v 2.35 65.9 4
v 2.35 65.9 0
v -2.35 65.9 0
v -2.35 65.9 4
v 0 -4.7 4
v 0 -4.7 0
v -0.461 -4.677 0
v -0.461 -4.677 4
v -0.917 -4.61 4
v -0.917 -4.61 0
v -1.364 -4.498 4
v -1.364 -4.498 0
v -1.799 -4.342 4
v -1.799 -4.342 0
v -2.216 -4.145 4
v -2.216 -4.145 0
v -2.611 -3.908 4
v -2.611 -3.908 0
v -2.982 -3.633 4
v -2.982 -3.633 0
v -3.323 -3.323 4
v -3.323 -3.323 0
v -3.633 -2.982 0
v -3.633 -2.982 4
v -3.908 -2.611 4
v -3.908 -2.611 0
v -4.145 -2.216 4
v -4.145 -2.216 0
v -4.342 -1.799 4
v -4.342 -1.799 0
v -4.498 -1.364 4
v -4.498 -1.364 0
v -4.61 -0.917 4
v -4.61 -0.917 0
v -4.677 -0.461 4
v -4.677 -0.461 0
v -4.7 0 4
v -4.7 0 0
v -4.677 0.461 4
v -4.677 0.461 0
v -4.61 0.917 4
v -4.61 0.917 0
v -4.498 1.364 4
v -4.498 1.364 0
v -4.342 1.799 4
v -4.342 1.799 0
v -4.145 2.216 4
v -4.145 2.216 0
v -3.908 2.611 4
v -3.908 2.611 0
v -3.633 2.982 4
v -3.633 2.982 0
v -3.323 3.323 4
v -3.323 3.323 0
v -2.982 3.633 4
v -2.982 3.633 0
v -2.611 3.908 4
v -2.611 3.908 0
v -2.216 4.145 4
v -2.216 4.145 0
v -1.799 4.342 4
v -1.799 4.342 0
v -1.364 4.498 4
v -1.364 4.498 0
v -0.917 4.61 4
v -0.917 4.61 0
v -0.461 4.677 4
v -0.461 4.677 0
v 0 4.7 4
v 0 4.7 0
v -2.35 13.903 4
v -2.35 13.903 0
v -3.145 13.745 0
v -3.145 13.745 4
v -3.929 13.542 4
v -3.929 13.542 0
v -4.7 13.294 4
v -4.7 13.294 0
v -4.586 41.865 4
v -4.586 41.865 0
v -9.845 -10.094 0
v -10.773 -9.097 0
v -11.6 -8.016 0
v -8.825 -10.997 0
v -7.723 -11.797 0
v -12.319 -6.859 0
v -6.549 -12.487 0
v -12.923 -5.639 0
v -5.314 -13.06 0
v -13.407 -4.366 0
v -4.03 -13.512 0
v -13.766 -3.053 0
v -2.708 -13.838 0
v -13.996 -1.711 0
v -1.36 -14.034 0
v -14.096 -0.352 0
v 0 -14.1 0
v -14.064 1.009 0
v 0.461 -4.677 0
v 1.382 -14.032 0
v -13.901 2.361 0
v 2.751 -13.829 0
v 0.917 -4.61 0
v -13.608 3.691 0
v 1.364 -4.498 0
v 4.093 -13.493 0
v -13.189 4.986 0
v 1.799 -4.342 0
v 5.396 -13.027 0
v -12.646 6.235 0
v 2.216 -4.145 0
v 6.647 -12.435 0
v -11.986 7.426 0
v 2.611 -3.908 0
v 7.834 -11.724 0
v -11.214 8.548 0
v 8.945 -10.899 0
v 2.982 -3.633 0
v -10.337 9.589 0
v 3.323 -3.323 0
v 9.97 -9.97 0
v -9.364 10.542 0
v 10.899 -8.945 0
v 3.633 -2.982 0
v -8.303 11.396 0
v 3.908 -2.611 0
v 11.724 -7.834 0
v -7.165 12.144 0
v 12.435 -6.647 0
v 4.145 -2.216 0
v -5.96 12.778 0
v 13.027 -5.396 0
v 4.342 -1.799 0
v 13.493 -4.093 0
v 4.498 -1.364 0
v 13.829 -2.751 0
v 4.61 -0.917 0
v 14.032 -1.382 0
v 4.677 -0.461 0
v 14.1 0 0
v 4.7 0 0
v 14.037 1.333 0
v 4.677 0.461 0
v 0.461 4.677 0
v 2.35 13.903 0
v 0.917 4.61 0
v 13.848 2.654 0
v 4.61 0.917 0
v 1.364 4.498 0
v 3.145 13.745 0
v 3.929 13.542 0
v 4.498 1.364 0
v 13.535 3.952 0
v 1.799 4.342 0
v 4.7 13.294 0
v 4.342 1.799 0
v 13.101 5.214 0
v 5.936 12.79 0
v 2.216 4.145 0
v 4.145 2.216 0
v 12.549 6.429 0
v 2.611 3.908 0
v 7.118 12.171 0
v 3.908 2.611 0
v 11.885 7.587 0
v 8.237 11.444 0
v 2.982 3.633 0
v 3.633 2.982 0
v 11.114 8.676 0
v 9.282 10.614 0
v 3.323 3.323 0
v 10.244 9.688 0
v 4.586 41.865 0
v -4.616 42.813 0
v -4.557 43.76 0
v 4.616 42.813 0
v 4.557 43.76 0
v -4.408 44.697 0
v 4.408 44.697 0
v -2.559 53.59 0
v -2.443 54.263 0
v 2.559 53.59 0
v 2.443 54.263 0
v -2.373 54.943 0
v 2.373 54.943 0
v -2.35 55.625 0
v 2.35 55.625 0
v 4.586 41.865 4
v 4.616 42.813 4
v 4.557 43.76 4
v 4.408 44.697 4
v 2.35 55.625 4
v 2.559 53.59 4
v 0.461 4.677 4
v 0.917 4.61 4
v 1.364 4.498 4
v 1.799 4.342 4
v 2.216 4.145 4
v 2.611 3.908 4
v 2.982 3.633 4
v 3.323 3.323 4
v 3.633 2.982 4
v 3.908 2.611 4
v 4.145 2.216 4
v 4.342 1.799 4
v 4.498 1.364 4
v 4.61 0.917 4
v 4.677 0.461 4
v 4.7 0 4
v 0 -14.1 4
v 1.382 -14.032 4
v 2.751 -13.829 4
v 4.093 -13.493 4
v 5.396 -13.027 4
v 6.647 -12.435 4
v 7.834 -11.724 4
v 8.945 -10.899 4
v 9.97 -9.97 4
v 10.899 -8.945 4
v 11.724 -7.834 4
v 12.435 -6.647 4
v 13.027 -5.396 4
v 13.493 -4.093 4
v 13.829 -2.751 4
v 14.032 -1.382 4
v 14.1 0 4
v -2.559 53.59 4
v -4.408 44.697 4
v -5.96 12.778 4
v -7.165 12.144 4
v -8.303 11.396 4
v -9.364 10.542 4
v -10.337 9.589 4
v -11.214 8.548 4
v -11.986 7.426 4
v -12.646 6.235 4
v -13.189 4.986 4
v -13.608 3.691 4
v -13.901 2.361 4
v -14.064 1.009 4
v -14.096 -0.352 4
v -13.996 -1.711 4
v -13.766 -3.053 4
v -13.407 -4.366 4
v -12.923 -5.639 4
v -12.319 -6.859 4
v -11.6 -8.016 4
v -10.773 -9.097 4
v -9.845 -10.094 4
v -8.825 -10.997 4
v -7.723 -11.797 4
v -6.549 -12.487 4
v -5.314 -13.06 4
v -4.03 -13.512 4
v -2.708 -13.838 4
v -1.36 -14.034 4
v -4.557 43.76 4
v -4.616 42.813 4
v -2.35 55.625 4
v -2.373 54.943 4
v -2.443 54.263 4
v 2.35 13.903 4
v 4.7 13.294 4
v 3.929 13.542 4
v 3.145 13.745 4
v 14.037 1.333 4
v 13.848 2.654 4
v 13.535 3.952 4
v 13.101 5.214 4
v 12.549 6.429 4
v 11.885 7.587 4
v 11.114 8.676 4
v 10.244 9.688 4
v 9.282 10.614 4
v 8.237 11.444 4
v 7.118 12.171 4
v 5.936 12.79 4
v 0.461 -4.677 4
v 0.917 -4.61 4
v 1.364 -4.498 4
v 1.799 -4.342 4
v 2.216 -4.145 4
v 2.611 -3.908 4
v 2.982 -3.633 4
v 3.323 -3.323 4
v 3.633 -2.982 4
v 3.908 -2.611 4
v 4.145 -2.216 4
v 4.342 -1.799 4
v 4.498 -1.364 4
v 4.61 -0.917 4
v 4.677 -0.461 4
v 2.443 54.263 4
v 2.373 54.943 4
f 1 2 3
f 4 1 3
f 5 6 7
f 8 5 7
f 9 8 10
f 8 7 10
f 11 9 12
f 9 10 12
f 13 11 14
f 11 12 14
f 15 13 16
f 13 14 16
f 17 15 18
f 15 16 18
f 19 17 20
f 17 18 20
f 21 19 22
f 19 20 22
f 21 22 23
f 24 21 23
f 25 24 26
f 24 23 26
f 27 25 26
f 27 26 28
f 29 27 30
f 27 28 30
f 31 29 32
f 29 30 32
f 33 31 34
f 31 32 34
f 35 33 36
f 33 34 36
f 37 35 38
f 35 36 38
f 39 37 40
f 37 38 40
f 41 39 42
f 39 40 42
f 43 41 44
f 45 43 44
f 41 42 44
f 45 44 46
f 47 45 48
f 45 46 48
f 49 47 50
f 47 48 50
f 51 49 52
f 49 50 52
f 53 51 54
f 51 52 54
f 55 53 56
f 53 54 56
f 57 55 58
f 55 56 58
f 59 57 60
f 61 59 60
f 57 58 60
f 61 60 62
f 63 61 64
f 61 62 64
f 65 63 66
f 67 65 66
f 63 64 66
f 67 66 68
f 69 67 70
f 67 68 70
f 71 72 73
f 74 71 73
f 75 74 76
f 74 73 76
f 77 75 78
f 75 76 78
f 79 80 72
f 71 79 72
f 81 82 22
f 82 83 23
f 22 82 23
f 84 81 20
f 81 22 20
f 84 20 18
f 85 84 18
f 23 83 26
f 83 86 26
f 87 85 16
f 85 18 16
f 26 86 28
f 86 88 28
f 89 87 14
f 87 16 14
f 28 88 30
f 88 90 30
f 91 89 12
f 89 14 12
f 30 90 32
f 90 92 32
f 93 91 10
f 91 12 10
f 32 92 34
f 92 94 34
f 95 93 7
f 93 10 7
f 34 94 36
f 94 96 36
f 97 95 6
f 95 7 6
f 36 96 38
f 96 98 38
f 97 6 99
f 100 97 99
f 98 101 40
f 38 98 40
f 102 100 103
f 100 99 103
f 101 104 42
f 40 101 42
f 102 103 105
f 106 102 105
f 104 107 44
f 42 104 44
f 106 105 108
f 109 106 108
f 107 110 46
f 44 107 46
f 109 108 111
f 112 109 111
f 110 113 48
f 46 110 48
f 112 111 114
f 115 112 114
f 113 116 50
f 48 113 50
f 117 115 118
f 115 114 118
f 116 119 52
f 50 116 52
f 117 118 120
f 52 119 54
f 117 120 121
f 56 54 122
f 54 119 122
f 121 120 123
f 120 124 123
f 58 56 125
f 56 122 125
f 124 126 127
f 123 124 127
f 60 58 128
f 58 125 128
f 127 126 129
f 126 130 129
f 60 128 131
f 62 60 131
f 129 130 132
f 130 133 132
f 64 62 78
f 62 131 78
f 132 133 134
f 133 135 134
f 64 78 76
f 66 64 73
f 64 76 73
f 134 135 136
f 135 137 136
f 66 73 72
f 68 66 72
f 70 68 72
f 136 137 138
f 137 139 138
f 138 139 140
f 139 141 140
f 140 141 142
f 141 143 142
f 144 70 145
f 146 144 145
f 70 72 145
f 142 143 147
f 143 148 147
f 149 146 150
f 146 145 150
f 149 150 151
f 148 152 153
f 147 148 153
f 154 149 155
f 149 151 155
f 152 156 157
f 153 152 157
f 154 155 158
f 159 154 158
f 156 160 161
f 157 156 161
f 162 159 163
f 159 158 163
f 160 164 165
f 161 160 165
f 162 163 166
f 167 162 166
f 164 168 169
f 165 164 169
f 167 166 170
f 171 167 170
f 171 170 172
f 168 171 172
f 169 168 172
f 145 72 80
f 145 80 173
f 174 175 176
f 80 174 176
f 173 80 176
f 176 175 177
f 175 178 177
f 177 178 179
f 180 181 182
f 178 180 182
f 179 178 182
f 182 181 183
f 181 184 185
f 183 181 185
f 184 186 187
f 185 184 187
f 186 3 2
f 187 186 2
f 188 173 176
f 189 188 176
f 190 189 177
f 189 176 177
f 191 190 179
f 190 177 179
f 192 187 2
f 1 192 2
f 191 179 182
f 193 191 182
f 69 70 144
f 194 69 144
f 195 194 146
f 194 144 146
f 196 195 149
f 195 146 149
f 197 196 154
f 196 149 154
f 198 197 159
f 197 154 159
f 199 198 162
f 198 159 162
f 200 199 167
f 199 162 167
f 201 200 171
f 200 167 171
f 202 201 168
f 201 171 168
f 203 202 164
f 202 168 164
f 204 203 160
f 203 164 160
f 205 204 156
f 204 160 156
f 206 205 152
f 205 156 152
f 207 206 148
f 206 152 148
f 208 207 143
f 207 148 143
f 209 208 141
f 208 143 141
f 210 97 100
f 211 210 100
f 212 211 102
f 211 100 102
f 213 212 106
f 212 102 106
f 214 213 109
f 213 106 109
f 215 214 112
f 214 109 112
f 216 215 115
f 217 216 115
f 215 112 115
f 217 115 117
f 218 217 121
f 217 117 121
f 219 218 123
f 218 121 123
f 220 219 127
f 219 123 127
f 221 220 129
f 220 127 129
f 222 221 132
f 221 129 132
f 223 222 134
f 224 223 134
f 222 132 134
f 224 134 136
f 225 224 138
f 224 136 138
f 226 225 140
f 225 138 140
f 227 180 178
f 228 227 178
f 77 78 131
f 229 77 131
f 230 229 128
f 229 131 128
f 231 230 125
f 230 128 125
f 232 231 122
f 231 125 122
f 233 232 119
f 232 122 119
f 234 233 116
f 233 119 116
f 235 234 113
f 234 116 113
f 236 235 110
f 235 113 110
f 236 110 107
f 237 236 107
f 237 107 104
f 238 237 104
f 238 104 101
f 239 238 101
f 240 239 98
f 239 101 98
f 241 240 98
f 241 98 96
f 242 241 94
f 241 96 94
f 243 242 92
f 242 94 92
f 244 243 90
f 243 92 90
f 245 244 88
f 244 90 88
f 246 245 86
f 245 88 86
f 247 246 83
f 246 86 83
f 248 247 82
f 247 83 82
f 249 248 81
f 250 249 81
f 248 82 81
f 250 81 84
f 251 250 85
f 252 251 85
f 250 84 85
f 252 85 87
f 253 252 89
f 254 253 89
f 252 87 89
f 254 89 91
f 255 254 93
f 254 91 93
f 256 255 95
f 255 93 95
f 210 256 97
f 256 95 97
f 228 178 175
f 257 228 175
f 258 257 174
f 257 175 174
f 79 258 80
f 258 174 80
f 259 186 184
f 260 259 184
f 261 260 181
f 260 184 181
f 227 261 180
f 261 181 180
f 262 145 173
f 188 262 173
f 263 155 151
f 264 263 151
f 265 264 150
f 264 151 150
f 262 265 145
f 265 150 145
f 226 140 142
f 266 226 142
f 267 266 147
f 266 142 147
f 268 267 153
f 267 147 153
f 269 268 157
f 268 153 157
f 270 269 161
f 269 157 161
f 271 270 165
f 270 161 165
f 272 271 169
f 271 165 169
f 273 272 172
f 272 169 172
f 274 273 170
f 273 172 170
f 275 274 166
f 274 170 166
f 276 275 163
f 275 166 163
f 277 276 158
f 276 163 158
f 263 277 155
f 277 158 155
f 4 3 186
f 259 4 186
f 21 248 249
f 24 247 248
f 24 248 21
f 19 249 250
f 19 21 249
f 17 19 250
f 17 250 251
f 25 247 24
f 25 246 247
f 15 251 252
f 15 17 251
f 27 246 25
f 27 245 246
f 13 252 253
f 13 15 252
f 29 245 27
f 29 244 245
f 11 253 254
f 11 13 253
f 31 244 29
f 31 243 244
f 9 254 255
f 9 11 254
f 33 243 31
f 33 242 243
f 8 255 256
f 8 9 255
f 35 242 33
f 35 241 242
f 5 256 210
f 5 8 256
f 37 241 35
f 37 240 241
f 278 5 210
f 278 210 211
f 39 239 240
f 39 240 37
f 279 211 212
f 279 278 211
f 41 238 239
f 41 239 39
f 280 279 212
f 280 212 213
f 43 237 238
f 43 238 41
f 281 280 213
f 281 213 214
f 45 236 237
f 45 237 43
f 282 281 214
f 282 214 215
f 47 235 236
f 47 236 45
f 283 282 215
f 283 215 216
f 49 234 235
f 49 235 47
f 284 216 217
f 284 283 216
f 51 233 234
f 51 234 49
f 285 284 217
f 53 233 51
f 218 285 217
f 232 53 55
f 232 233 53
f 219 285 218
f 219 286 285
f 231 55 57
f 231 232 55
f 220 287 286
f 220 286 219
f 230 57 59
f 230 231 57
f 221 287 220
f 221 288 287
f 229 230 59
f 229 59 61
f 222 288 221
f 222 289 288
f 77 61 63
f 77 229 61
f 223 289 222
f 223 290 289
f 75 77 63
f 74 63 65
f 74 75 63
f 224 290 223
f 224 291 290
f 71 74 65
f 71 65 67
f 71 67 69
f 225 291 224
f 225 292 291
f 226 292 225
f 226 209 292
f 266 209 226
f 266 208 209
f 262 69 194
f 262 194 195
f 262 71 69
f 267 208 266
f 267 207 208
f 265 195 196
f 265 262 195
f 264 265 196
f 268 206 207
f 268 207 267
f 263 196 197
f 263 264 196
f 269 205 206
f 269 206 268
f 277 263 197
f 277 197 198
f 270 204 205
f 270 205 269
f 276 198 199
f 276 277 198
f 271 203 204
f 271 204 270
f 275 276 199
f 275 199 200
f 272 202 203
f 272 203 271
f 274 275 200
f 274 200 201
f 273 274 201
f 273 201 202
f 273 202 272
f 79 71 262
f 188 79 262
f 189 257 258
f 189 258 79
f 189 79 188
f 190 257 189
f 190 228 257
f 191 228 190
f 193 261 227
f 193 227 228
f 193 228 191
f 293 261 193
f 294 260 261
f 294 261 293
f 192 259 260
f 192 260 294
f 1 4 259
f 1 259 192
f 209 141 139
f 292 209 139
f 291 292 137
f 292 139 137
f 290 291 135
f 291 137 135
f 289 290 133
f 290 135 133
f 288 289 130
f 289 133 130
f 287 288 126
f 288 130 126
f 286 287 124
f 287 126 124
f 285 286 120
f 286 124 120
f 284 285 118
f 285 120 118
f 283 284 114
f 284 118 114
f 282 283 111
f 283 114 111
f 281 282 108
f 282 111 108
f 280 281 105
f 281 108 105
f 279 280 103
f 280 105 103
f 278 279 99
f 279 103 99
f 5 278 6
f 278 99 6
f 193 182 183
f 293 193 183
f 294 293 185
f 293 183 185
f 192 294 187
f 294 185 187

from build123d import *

# Parameters (mm, degrees)
BOSS_EXTRUDE1_DEPTH = 4


with BuildPart() as part:
    # Sketch1 → Boss-Extrude1 (new body)
    with BuildSketch(Plane.XY):
        with BuildLine():
            ThreePointArc((0, 4.7), (3.323401872, 3.323401872), (4.7, 0))
            ThreePointArc((4.7, 0), (3.323401872, -3.323401872), (0, -4.7))
            Line((0, -4.7), (0, -14.1))
            ThreePointArc((0, -14.1), (9.970205615, -9.970205615), (14.1, 0))
            ThreePointArc((14.1, 0), (11.512601791, 8.140638796), (4.7, 13.293607486))
            ThreePointArc((4.7, 13.293607486), (3.538135112, 13.648868082), (2.35, 13.90278749))
            ThreePointArc((2.35, 13.90278749), (1.17913027, 14.050610371), (0, 14.1))
            Line((0, 14.1), (0, 4.7))
        make_face()
        with BuildLine():
            Line((0, -14.1), (0, -4.7))
            ThreePointArc((0, -4.7), (-4.7, 0), (0, 4.7))
            Line((0, 4.7), (0, 14.1))
            ThreePointArc((0, 14.1), (-1.17913027, 14.050610371), (-2.35, 13.90278749))
            ThreePointArc((-2.35, 13.90278749), (-3.538135112, 13.648868082), (-4.7, 13.293607486))
            ThreePointArc((-4.7, 13.293607486), (-13.896939691, -2.3843379), (0, -14.1))
        make_face()
        with BuildLine():
            ThreePointArc((-2.35, 13.90278749), (-1.17913027, 14.050610371), (0, 14.1))
            Line((0, 14.1), (0, 65.9))
            Line((0, 65.9), (-2.35, 65.9))
            Line((-2.35, 65.9), (-2.35, 55.625335767))
            ThreePointArc((-2.35, 55.625335767), (-2.402477907, 54.602201264), (-2.559360842, 53.589805153))
            Line((-2.559360842, 53.589805153), (-4.408193437, 44.697159337))
            ThreePointArc((-4.408193437, 44.697159337), (-4.597967377, 43.28721197), (-4.585741176, 41.864603012))
            Line((-4.585741176, 41.864603012), (-2.35, 13.90278749))
        make_face()
        with BuildLine():
            Line((0, 65.9), (0, 14.1))
            ThreePointArc((0, 14.1), (1.17913027, 14.050610371), (2.35, 13.90278749))
            Line((2.35, 13.90278749), (4.585741176, 41.864603012))
            ThreePointArc((4.585741176, 41.864603012), (4.597967377, 43.28721197), (4.408193437, 44.697159337))
            Line((4.408193437, 44.697159337), (2.559360842, 53.589805153))
            ThreePointArc((2.559360842, 53.589805153), (2.402477907, 54.602201264), (2.35, 55.625335767))
            Line((2.35, 55.625335767), (2.35, 65.9))
            Line((2.35, 65.9), (0, 65.9))
        make_face()
    extrude(amount=BOSS_EXTRUDE1_DEPTH)


solid = part.part
